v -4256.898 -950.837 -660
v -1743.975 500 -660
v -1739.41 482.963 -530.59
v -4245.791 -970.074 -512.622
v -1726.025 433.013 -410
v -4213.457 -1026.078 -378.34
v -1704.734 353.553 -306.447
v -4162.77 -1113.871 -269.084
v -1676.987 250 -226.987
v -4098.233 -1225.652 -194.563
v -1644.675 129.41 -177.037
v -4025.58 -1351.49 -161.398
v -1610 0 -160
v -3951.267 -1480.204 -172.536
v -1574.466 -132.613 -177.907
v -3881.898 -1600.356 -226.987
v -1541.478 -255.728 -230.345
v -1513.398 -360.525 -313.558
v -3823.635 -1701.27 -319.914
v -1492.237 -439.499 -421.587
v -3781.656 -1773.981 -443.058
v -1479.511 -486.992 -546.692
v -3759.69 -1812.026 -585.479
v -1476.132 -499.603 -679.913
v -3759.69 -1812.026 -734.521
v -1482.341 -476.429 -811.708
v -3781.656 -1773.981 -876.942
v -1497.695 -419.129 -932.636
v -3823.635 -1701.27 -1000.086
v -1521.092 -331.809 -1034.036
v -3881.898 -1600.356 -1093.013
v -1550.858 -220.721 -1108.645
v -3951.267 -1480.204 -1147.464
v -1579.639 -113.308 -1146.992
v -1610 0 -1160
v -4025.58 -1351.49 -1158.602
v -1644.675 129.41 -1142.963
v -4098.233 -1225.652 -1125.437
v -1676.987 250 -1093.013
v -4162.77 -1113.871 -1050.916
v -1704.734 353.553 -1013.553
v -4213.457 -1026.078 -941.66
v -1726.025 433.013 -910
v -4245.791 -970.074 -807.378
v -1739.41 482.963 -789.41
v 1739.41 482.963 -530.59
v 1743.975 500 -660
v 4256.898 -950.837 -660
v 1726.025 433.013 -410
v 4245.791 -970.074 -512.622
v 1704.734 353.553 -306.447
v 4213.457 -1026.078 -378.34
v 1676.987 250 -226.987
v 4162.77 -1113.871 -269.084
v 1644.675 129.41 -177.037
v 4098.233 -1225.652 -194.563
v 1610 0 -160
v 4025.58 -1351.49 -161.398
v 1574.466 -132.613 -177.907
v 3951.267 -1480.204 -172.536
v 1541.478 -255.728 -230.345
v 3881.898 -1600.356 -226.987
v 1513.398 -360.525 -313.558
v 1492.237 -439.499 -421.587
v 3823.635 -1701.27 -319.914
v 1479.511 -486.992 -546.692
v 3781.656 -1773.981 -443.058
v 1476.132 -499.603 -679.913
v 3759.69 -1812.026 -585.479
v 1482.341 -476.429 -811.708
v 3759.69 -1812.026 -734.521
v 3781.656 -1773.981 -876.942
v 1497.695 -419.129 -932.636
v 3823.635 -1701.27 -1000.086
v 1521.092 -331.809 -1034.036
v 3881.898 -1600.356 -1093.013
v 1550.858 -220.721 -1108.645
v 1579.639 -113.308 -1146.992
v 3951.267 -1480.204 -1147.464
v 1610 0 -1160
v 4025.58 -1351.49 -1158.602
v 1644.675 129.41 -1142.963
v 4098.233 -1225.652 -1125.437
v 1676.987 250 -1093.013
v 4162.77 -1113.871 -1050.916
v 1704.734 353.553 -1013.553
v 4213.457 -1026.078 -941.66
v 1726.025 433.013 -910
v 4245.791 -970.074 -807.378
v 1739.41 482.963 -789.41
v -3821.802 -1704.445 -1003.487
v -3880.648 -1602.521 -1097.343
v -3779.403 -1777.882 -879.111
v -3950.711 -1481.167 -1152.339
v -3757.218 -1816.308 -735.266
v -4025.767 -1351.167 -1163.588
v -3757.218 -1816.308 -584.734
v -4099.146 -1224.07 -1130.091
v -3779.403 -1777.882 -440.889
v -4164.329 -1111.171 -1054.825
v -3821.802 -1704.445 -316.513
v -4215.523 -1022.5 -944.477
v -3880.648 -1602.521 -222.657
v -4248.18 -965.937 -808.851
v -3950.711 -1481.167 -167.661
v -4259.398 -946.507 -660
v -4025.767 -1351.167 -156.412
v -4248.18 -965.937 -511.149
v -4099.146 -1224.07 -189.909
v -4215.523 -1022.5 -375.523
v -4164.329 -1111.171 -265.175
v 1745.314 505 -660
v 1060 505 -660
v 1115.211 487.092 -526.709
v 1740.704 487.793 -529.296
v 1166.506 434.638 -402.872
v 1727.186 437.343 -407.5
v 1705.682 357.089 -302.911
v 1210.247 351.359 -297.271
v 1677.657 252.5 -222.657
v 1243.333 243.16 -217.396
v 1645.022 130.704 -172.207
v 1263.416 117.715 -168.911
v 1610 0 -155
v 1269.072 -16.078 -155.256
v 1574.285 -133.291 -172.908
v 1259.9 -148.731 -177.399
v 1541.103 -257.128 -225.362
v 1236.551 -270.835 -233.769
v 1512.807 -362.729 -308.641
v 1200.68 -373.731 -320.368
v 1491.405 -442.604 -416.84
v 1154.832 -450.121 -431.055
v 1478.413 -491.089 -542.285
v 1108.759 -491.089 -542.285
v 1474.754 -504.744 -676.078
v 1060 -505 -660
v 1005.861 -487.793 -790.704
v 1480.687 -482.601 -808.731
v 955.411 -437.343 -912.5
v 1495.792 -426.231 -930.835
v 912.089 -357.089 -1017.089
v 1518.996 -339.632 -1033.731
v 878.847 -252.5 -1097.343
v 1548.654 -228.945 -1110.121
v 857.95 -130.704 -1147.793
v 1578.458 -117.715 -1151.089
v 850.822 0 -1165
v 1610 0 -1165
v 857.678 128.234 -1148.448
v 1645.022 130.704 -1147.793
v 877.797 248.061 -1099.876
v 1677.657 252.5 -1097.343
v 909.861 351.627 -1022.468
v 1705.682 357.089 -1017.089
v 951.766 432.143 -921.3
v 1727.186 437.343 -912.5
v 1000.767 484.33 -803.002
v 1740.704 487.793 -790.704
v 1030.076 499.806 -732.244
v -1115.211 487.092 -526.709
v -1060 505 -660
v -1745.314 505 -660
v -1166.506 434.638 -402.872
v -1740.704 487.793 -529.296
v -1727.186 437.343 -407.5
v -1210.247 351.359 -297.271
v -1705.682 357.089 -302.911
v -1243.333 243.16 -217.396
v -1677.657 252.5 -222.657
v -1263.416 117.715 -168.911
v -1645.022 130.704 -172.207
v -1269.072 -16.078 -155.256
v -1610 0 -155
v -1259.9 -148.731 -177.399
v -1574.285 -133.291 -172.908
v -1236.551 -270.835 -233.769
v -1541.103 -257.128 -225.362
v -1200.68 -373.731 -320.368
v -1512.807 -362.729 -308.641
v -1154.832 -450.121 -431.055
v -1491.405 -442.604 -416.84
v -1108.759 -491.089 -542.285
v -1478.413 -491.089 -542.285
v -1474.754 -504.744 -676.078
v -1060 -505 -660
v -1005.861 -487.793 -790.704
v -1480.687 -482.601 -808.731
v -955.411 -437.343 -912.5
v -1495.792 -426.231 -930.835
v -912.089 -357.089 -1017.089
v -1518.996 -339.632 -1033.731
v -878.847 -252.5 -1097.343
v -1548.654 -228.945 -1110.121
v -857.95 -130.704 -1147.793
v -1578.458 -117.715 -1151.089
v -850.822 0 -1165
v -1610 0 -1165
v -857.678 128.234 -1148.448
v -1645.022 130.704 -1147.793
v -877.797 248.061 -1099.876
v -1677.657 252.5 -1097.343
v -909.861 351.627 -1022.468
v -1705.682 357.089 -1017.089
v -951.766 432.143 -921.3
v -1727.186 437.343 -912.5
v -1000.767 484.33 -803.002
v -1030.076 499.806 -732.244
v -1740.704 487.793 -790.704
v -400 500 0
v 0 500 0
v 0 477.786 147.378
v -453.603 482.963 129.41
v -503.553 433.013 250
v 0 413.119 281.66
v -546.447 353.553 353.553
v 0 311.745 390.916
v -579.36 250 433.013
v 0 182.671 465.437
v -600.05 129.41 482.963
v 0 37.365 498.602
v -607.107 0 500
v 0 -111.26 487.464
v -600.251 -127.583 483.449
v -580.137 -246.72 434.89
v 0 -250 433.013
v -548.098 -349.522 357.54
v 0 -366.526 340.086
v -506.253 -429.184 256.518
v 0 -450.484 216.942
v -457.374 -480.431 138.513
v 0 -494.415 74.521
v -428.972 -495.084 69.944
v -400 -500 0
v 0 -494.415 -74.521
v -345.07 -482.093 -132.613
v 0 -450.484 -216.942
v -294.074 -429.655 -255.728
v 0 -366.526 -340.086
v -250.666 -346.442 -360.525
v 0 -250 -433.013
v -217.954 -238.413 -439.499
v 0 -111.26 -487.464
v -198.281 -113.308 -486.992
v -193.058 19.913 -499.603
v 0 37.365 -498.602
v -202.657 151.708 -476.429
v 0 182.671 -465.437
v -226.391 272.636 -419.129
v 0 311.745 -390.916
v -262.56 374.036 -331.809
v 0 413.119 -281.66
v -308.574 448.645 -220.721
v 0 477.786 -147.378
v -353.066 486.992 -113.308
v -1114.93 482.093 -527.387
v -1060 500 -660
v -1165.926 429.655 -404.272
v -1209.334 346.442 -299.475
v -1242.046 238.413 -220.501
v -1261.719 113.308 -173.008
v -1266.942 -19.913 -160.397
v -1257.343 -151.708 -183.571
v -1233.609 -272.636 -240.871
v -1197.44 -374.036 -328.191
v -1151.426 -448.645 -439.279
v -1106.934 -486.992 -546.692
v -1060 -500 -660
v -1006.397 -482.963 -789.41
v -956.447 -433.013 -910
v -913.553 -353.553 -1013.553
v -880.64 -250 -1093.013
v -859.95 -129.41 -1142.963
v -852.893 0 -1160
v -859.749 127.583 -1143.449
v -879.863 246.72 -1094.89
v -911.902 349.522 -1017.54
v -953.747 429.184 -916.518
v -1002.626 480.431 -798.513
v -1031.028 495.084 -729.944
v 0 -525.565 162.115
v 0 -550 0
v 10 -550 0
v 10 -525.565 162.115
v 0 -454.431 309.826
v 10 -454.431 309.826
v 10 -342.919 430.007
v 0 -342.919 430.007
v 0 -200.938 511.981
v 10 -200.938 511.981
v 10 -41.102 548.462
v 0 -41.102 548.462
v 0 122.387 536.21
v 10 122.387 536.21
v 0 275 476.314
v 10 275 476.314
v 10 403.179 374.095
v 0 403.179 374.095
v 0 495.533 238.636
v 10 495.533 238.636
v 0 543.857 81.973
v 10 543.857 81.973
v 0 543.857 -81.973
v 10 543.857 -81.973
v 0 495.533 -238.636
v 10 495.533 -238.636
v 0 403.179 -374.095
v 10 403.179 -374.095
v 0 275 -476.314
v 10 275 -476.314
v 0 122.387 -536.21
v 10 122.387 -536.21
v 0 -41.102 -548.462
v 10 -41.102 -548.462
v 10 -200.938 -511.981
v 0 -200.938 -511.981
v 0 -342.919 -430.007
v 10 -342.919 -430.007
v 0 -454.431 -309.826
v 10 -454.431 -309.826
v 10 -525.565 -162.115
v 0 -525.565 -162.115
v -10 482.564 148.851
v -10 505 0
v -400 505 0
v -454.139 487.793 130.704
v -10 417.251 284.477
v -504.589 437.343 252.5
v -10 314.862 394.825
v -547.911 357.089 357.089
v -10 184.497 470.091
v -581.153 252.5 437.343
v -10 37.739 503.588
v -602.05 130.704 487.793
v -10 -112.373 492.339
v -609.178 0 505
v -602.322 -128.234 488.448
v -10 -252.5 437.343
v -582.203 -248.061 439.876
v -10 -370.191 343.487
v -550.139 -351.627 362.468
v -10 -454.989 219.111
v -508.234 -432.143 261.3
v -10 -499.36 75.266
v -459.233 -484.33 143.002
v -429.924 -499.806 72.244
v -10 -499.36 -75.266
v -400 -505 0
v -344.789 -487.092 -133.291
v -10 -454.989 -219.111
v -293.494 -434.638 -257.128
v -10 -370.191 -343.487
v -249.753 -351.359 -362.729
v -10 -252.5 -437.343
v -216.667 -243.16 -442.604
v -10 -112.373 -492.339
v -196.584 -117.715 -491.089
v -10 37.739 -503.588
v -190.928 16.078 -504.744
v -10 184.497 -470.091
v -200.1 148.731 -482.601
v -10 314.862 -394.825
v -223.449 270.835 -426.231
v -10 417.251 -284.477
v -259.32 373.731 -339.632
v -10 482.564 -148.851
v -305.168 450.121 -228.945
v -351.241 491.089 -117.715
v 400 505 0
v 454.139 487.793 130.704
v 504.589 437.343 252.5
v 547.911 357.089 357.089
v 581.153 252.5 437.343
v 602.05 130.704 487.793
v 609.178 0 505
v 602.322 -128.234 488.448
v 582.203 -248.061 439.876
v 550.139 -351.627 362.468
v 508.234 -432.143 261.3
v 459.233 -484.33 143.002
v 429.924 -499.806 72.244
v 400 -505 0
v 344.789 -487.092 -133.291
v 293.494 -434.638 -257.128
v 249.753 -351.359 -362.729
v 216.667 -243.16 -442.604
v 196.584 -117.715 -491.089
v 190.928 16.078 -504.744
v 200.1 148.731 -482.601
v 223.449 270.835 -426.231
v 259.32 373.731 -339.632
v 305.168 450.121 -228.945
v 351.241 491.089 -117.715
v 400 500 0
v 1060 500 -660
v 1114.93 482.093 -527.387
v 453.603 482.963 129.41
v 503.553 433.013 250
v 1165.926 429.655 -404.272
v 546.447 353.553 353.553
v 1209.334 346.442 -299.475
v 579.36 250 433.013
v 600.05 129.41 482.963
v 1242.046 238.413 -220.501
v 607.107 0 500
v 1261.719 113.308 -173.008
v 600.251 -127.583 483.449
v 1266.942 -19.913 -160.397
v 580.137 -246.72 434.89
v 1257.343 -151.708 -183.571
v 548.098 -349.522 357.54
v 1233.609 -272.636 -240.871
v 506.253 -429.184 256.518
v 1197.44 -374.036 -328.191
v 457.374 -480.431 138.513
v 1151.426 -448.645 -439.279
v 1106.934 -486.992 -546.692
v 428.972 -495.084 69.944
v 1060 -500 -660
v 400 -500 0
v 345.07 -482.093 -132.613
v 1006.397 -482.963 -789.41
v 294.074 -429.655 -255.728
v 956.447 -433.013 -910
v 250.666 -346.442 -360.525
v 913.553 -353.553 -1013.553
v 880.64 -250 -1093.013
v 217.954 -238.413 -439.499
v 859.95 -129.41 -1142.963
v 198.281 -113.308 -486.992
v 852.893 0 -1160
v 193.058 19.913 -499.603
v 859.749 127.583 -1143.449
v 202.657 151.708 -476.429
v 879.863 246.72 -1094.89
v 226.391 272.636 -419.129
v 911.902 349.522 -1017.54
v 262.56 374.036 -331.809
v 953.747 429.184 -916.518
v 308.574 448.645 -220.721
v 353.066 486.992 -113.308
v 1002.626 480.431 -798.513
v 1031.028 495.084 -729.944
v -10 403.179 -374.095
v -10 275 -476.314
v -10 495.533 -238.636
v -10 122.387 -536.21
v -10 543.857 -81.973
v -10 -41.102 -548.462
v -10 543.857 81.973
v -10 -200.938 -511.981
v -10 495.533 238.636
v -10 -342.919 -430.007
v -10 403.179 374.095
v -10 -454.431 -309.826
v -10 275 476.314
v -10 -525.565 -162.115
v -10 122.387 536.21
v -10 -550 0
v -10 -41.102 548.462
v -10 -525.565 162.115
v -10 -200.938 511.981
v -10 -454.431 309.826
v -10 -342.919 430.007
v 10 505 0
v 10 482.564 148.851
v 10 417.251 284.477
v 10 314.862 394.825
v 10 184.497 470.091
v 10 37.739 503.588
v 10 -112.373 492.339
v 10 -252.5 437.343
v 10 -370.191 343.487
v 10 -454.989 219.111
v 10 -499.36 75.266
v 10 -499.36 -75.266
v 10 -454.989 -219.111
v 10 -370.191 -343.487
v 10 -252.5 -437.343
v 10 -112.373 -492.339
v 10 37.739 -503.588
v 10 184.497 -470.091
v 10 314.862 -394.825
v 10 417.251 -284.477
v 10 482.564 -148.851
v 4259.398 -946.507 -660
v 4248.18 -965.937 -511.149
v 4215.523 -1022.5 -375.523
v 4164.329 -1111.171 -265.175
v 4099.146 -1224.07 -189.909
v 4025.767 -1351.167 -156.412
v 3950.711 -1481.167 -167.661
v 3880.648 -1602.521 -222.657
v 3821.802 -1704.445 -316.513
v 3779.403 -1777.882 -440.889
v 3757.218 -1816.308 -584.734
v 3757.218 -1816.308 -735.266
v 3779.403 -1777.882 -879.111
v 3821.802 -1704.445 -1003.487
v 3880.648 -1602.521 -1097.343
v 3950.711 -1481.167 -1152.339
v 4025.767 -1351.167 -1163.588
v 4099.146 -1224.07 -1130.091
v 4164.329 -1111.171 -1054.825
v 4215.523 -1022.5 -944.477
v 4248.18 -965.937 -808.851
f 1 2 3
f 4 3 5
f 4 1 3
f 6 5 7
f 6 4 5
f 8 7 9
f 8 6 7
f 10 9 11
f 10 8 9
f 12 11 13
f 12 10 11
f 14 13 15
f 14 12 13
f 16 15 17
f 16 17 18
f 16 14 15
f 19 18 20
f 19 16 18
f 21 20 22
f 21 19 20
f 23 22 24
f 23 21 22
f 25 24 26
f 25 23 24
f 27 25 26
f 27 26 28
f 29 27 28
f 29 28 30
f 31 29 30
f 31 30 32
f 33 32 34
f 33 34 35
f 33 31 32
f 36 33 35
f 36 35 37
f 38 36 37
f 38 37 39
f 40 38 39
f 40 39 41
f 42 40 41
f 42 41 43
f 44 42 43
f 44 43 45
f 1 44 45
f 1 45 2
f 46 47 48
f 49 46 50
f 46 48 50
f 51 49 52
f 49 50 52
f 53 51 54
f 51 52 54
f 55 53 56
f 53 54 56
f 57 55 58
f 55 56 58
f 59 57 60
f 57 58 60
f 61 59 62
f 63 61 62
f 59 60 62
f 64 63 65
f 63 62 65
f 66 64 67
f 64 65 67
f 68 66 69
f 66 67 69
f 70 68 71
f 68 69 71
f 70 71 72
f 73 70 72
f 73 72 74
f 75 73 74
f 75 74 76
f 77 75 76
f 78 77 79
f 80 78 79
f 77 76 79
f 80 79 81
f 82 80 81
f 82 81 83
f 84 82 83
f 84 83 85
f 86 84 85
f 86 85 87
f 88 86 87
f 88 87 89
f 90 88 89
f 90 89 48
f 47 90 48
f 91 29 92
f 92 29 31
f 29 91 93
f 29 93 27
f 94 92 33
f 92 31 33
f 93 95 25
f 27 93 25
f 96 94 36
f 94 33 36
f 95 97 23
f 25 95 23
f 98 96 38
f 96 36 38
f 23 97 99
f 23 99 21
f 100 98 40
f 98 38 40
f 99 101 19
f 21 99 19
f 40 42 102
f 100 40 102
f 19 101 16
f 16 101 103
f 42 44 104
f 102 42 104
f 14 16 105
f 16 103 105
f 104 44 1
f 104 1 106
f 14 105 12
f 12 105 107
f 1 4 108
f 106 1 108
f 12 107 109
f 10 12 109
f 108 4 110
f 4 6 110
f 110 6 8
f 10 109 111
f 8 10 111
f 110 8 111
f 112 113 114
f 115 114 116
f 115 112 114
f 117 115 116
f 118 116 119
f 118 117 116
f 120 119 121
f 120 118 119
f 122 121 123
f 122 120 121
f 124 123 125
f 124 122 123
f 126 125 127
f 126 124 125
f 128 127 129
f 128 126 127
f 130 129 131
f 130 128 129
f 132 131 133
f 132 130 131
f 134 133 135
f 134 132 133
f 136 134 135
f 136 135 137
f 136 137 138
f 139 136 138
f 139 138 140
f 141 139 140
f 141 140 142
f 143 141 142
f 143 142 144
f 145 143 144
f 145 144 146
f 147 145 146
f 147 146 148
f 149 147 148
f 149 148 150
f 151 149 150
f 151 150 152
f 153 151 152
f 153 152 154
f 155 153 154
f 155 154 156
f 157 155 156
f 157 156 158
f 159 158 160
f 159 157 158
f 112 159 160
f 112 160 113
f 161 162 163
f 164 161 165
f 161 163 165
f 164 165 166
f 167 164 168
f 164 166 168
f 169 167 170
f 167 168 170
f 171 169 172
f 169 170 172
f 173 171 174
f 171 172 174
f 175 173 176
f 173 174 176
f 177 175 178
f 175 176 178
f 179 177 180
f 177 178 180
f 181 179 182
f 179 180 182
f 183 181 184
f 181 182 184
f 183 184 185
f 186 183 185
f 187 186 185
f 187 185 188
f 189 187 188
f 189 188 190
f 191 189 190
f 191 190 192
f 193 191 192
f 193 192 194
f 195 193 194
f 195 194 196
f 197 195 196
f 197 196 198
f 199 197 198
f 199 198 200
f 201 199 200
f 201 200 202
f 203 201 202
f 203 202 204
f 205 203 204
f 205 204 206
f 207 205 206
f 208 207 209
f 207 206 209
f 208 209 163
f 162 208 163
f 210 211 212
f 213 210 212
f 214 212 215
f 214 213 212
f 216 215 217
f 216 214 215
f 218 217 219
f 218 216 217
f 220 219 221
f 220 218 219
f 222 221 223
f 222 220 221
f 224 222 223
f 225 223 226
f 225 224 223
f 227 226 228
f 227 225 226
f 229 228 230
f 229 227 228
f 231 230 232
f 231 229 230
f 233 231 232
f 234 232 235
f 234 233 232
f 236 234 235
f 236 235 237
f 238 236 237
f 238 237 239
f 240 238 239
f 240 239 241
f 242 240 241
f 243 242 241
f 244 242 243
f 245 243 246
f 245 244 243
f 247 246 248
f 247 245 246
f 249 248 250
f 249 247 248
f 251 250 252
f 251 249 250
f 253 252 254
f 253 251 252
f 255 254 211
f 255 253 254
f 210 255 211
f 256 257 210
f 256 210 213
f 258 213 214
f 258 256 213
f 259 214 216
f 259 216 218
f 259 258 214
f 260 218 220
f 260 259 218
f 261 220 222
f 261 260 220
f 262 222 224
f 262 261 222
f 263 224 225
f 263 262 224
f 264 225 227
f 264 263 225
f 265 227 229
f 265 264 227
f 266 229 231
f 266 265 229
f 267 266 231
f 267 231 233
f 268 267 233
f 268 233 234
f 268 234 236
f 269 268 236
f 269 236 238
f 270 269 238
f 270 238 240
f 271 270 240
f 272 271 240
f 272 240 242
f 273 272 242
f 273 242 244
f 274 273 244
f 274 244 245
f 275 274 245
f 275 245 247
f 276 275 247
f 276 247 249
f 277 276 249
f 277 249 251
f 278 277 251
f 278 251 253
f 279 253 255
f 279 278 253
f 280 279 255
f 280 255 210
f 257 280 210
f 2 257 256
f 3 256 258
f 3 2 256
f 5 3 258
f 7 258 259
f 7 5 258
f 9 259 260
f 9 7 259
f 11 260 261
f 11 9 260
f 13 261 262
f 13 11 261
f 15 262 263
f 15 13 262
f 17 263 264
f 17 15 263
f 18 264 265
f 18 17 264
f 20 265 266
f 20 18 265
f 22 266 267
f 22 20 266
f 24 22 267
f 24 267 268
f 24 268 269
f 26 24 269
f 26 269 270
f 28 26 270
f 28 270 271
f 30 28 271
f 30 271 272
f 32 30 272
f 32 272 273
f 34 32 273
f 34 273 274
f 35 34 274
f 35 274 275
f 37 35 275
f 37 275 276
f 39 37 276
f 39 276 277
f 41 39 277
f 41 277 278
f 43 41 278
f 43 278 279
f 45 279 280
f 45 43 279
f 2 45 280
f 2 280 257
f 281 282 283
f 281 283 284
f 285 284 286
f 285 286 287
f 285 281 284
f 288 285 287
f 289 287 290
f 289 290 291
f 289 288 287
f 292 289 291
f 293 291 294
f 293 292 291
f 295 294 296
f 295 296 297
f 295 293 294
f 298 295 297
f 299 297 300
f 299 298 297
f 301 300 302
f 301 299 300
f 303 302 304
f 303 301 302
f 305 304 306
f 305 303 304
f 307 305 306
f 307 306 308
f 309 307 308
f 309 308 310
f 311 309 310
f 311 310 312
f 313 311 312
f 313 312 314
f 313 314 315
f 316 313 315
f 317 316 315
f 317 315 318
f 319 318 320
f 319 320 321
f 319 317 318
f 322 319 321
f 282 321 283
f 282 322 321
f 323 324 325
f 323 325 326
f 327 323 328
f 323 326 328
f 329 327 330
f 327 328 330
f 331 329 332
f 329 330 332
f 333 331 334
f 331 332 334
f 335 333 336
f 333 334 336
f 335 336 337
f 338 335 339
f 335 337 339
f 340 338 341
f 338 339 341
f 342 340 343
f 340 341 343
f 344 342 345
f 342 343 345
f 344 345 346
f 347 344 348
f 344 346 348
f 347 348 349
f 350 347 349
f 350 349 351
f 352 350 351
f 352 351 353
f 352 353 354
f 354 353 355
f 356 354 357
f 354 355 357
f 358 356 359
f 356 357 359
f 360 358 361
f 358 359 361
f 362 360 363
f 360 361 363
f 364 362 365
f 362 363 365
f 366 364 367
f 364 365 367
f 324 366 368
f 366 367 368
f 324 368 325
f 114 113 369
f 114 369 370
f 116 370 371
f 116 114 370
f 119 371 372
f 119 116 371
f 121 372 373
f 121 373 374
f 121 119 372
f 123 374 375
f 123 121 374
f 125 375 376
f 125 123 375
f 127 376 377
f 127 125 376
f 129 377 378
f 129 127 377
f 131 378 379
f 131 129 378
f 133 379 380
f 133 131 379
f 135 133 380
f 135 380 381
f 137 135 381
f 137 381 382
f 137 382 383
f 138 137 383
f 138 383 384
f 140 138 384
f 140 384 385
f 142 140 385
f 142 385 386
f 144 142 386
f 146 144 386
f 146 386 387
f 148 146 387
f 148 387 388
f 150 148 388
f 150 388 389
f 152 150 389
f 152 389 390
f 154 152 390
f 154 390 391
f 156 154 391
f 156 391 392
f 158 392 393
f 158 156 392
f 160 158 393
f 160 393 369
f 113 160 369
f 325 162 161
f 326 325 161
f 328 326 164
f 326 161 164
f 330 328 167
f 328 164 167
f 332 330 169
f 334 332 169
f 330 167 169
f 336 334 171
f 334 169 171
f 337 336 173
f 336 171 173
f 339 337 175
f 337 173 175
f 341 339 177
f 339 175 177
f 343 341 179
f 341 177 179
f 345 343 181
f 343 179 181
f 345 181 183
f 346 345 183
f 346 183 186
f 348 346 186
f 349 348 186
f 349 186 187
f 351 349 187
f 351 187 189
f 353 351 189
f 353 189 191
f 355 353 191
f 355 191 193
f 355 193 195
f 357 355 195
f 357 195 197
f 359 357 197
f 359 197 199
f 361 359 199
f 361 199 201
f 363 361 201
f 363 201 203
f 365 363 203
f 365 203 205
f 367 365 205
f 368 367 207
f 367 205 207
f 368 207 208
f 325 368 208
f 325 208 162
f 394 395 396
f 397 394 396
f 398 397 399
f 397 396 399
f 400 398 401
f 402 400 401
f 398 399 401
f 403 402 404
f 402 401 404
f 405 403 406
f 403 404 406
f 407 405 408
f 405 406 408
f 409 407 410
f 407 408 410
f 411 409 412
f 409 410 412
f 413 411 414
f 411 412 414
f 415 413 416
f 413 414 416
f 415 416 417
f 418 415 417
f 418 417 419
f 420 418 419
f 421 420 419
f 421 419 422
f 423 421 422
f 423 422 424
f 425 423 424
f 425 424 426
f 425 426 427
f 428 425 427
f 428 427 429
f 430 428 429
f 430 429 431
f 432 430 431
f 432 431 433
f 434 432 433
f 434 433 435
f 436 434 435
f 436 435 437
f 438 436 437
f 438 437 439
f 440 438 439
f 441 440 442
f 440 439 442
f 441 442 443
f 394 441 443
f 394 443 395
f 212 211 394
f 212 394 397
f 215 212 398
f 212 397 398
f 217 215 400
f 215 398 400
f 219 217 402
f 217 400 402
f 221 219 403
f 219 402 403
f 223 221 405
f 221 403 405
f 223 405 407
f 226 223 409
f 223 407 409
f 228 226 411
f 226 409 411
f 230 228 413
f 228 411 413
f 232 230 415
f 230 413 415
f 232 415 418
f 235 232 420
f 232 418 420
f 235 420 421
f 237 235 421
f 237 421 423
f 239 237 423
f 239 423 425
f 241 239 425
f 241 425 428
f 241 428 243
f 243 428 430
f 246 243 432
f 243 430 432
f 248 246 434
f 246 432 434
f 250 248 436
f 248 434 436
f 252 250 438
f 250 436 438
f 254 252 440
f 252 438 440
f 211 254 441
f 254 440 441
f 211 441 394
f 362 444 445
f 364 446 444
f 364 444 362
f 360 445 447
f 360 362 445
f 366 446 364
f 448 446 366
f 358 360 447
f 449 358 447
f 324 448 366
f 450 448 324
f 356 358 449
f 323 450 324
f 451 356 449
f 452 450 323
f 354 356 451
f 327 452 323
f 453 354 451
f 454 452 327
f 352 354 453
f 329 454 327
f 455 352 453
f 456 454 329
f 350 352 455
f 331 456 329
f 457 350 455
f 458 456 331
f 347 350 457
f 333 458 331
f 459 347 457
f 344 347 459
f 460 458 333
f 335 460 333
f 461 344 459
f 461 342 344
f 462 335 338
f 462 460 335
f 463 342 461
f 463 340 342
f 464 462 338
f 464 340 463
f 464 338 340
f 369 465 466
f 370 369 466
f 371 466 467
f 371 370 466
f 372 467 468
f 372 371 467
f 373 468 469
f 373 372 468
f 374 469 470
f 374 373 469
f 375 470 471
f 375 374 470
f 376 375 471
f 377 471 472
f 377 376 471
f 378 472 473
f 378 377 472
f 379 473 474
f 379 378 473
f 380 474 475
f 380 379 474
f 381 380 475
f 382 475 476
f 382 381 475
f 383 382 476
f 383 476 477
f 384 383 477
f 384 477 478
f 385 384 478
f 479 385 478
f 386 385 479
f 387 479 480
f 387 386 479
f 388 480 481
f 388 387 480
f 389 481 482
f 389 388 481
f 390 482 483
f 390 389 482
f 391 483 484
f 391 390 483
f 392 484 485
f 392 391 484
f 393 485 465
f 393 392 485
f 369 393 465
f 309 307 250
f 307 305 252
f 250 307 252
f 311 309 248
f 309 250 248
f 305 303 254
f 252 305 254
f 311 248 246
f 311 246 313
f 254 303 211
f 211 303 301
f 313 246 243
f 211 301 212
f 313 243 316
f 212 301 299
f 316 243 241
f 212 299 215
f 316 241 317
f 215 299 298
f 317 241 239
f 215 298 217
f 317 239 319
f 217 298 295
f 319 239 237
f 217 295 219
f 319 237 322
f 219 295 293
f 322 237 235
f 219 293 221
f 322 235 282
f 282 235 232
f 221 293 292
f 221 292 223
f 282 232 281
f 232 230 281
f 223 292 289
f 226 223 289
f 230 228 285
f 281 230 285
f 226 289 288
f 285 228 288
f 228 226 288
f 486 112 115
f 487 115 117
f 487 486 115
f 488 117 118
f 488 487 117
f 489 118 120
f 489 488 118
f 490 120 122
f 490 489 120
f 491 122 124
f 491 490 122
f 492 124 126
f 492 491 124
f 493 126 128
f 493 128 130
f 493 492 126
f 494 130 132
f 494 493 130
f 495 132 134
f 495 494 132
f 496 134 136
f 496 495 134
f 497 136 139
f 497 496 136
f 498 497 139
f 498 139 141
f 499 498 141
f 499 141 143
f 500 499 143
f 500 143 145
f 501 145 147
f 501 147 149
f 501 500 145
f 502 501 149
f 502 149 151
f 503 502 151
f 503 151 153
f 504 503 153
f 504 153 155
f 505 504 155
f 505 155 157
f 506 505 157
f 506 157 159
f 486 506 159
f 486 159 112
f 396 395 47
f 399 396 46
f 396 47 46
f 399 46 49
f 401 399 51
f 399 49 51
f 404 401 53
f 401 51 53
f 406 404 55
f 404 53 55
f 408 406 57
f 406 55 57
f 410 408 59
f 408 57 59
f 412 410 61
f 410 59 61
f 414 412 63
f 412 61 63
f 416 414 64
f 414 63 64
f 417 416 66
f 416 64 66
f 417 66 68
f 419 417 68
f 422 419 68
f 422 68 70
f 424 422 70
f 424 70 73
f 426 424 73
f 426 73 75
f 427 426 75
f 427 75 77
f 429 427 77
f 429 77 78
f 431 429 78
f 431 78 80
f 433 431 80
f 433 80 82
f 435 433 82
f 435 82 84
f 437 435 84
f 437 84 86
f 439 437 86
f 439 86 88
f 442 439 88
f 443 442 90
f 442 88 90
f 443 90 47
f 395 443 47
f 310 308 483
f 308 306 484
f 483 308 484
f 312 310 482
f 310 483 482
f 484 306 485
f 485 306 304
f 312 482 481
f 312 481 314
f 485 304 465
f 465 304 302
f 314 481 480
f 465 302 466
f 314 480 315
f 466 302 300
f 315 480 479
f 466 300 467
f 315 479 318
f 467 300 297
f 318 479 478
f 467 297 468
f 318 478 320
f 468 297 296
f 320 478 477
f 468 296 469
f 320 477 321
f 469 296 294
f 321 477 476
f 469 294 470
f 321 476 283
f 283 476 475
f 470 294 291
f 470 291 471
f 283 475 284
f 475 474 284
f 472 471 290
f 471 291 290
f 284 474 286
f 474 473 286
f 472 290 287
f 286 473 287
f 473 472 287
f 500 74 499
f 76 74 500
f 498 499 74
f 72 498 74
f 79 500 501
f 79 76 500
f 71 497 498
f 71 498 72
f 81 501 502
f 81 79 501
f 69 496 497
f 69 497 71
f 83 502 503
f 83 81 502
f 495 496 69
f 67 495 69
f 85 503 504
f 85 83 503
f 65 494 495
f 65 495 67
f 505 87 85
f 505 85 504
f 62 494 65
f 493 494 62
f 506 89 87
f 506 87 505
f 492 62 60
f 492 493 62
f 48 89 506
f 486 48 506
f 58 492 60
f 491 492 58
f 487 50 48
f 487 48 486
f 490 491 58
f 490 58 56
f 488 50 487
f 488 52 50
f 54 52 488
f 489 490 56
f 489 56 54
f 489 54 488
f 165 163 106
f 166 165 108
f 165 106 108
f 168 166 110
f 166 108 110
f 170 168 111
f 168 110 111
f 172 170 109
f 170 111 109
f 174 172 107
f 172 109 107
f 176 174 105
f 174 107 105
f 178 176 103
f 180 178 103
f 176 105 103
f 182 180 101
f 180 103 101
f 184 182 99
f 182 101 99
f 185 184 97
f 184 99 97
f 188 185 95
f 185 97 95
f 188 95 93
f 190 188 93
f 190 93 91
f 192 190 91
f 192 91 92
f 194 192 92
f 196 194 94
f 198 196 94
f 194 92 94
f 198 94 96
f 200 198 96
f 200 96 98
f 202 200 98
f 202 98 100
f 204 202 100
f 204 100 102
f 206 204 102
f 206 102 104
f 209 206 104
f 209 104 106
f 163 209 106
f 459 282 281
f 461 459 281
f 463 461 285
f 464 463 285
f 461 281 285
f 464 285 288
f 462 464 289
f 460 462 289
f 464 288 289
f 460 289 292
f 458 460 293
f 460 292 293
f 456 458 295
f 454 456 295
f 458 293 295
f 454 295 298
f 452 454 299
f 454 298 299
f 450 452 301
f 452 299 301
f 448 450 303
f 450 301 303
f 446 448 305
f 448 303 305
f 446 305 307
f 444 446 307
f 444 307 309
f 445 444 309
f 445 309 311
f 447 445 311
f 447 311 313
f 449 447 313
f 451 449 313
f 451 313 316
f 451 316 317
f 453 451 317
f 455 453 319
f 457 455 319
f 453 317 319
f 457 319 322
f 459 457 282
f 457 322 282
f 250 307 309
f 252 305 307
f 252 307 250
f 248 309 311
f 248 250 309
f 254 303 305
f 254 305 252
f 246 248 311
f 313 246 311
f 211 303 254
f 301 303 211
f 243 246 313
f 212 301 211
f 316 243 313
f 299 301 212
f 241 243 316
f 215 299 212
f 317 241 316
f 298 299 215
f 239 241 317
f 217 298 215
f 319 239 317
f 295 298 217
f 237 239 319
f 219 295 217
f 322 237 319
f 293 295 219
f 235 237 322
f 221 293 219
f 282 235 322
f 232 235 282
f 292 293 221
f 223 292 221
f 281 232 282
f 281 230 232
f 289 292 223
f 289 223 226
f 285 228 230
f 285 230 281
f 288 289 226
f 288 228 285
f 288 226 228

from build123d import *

# Parameters (mm, degrees)
F4_R     = 505
F4_R_2   = 500
F6_R     = 550
F6_R_2   = 500
F7_DEPTH = 10


with BuildPart() as f5:
    # F5: sweep along a path in F3, F2
    with BuildLine(Plane.XZ) as f5_path:
        Line((0, 0), (400, 0))
        Line((400, 0), (1060, -660))
        Line((1060, -660), (1610, -660))
    with BuildLine(Plane.XY.offset(-660)) as f5_path_2:
        Line((1610, 0), (4006.8977305508, -1383.8495499535))
    # F4 (on Right) → F5 (sweep)
    with BuildSketch(Plane.YZ):
        Circle(F4_R)
        Circle(F4_R_2, mode=Mode.SUBTRACT)
    sweep(path=f5_path.line + f5_path_2.line, transition=Transition.RIGHT)

    # F6 (on face) → F7 (join)
    with BuildSketch(Plane(origin=(0, 0, 0), x_dir=(0, -1, 0), z_dir=(-1, 0, 0))):
        Circle(F6_R)
        Circle(F6_R_2, mode=Mode.SUBTRACT)
    extrude(amount=-F7_DEPTH)


with BuildPart() as f8_1:
    # F8: instance of F5
    add(f5.part.mirror(Plane.YZ))


solid = Compound([f5.part, f8_1.part])
